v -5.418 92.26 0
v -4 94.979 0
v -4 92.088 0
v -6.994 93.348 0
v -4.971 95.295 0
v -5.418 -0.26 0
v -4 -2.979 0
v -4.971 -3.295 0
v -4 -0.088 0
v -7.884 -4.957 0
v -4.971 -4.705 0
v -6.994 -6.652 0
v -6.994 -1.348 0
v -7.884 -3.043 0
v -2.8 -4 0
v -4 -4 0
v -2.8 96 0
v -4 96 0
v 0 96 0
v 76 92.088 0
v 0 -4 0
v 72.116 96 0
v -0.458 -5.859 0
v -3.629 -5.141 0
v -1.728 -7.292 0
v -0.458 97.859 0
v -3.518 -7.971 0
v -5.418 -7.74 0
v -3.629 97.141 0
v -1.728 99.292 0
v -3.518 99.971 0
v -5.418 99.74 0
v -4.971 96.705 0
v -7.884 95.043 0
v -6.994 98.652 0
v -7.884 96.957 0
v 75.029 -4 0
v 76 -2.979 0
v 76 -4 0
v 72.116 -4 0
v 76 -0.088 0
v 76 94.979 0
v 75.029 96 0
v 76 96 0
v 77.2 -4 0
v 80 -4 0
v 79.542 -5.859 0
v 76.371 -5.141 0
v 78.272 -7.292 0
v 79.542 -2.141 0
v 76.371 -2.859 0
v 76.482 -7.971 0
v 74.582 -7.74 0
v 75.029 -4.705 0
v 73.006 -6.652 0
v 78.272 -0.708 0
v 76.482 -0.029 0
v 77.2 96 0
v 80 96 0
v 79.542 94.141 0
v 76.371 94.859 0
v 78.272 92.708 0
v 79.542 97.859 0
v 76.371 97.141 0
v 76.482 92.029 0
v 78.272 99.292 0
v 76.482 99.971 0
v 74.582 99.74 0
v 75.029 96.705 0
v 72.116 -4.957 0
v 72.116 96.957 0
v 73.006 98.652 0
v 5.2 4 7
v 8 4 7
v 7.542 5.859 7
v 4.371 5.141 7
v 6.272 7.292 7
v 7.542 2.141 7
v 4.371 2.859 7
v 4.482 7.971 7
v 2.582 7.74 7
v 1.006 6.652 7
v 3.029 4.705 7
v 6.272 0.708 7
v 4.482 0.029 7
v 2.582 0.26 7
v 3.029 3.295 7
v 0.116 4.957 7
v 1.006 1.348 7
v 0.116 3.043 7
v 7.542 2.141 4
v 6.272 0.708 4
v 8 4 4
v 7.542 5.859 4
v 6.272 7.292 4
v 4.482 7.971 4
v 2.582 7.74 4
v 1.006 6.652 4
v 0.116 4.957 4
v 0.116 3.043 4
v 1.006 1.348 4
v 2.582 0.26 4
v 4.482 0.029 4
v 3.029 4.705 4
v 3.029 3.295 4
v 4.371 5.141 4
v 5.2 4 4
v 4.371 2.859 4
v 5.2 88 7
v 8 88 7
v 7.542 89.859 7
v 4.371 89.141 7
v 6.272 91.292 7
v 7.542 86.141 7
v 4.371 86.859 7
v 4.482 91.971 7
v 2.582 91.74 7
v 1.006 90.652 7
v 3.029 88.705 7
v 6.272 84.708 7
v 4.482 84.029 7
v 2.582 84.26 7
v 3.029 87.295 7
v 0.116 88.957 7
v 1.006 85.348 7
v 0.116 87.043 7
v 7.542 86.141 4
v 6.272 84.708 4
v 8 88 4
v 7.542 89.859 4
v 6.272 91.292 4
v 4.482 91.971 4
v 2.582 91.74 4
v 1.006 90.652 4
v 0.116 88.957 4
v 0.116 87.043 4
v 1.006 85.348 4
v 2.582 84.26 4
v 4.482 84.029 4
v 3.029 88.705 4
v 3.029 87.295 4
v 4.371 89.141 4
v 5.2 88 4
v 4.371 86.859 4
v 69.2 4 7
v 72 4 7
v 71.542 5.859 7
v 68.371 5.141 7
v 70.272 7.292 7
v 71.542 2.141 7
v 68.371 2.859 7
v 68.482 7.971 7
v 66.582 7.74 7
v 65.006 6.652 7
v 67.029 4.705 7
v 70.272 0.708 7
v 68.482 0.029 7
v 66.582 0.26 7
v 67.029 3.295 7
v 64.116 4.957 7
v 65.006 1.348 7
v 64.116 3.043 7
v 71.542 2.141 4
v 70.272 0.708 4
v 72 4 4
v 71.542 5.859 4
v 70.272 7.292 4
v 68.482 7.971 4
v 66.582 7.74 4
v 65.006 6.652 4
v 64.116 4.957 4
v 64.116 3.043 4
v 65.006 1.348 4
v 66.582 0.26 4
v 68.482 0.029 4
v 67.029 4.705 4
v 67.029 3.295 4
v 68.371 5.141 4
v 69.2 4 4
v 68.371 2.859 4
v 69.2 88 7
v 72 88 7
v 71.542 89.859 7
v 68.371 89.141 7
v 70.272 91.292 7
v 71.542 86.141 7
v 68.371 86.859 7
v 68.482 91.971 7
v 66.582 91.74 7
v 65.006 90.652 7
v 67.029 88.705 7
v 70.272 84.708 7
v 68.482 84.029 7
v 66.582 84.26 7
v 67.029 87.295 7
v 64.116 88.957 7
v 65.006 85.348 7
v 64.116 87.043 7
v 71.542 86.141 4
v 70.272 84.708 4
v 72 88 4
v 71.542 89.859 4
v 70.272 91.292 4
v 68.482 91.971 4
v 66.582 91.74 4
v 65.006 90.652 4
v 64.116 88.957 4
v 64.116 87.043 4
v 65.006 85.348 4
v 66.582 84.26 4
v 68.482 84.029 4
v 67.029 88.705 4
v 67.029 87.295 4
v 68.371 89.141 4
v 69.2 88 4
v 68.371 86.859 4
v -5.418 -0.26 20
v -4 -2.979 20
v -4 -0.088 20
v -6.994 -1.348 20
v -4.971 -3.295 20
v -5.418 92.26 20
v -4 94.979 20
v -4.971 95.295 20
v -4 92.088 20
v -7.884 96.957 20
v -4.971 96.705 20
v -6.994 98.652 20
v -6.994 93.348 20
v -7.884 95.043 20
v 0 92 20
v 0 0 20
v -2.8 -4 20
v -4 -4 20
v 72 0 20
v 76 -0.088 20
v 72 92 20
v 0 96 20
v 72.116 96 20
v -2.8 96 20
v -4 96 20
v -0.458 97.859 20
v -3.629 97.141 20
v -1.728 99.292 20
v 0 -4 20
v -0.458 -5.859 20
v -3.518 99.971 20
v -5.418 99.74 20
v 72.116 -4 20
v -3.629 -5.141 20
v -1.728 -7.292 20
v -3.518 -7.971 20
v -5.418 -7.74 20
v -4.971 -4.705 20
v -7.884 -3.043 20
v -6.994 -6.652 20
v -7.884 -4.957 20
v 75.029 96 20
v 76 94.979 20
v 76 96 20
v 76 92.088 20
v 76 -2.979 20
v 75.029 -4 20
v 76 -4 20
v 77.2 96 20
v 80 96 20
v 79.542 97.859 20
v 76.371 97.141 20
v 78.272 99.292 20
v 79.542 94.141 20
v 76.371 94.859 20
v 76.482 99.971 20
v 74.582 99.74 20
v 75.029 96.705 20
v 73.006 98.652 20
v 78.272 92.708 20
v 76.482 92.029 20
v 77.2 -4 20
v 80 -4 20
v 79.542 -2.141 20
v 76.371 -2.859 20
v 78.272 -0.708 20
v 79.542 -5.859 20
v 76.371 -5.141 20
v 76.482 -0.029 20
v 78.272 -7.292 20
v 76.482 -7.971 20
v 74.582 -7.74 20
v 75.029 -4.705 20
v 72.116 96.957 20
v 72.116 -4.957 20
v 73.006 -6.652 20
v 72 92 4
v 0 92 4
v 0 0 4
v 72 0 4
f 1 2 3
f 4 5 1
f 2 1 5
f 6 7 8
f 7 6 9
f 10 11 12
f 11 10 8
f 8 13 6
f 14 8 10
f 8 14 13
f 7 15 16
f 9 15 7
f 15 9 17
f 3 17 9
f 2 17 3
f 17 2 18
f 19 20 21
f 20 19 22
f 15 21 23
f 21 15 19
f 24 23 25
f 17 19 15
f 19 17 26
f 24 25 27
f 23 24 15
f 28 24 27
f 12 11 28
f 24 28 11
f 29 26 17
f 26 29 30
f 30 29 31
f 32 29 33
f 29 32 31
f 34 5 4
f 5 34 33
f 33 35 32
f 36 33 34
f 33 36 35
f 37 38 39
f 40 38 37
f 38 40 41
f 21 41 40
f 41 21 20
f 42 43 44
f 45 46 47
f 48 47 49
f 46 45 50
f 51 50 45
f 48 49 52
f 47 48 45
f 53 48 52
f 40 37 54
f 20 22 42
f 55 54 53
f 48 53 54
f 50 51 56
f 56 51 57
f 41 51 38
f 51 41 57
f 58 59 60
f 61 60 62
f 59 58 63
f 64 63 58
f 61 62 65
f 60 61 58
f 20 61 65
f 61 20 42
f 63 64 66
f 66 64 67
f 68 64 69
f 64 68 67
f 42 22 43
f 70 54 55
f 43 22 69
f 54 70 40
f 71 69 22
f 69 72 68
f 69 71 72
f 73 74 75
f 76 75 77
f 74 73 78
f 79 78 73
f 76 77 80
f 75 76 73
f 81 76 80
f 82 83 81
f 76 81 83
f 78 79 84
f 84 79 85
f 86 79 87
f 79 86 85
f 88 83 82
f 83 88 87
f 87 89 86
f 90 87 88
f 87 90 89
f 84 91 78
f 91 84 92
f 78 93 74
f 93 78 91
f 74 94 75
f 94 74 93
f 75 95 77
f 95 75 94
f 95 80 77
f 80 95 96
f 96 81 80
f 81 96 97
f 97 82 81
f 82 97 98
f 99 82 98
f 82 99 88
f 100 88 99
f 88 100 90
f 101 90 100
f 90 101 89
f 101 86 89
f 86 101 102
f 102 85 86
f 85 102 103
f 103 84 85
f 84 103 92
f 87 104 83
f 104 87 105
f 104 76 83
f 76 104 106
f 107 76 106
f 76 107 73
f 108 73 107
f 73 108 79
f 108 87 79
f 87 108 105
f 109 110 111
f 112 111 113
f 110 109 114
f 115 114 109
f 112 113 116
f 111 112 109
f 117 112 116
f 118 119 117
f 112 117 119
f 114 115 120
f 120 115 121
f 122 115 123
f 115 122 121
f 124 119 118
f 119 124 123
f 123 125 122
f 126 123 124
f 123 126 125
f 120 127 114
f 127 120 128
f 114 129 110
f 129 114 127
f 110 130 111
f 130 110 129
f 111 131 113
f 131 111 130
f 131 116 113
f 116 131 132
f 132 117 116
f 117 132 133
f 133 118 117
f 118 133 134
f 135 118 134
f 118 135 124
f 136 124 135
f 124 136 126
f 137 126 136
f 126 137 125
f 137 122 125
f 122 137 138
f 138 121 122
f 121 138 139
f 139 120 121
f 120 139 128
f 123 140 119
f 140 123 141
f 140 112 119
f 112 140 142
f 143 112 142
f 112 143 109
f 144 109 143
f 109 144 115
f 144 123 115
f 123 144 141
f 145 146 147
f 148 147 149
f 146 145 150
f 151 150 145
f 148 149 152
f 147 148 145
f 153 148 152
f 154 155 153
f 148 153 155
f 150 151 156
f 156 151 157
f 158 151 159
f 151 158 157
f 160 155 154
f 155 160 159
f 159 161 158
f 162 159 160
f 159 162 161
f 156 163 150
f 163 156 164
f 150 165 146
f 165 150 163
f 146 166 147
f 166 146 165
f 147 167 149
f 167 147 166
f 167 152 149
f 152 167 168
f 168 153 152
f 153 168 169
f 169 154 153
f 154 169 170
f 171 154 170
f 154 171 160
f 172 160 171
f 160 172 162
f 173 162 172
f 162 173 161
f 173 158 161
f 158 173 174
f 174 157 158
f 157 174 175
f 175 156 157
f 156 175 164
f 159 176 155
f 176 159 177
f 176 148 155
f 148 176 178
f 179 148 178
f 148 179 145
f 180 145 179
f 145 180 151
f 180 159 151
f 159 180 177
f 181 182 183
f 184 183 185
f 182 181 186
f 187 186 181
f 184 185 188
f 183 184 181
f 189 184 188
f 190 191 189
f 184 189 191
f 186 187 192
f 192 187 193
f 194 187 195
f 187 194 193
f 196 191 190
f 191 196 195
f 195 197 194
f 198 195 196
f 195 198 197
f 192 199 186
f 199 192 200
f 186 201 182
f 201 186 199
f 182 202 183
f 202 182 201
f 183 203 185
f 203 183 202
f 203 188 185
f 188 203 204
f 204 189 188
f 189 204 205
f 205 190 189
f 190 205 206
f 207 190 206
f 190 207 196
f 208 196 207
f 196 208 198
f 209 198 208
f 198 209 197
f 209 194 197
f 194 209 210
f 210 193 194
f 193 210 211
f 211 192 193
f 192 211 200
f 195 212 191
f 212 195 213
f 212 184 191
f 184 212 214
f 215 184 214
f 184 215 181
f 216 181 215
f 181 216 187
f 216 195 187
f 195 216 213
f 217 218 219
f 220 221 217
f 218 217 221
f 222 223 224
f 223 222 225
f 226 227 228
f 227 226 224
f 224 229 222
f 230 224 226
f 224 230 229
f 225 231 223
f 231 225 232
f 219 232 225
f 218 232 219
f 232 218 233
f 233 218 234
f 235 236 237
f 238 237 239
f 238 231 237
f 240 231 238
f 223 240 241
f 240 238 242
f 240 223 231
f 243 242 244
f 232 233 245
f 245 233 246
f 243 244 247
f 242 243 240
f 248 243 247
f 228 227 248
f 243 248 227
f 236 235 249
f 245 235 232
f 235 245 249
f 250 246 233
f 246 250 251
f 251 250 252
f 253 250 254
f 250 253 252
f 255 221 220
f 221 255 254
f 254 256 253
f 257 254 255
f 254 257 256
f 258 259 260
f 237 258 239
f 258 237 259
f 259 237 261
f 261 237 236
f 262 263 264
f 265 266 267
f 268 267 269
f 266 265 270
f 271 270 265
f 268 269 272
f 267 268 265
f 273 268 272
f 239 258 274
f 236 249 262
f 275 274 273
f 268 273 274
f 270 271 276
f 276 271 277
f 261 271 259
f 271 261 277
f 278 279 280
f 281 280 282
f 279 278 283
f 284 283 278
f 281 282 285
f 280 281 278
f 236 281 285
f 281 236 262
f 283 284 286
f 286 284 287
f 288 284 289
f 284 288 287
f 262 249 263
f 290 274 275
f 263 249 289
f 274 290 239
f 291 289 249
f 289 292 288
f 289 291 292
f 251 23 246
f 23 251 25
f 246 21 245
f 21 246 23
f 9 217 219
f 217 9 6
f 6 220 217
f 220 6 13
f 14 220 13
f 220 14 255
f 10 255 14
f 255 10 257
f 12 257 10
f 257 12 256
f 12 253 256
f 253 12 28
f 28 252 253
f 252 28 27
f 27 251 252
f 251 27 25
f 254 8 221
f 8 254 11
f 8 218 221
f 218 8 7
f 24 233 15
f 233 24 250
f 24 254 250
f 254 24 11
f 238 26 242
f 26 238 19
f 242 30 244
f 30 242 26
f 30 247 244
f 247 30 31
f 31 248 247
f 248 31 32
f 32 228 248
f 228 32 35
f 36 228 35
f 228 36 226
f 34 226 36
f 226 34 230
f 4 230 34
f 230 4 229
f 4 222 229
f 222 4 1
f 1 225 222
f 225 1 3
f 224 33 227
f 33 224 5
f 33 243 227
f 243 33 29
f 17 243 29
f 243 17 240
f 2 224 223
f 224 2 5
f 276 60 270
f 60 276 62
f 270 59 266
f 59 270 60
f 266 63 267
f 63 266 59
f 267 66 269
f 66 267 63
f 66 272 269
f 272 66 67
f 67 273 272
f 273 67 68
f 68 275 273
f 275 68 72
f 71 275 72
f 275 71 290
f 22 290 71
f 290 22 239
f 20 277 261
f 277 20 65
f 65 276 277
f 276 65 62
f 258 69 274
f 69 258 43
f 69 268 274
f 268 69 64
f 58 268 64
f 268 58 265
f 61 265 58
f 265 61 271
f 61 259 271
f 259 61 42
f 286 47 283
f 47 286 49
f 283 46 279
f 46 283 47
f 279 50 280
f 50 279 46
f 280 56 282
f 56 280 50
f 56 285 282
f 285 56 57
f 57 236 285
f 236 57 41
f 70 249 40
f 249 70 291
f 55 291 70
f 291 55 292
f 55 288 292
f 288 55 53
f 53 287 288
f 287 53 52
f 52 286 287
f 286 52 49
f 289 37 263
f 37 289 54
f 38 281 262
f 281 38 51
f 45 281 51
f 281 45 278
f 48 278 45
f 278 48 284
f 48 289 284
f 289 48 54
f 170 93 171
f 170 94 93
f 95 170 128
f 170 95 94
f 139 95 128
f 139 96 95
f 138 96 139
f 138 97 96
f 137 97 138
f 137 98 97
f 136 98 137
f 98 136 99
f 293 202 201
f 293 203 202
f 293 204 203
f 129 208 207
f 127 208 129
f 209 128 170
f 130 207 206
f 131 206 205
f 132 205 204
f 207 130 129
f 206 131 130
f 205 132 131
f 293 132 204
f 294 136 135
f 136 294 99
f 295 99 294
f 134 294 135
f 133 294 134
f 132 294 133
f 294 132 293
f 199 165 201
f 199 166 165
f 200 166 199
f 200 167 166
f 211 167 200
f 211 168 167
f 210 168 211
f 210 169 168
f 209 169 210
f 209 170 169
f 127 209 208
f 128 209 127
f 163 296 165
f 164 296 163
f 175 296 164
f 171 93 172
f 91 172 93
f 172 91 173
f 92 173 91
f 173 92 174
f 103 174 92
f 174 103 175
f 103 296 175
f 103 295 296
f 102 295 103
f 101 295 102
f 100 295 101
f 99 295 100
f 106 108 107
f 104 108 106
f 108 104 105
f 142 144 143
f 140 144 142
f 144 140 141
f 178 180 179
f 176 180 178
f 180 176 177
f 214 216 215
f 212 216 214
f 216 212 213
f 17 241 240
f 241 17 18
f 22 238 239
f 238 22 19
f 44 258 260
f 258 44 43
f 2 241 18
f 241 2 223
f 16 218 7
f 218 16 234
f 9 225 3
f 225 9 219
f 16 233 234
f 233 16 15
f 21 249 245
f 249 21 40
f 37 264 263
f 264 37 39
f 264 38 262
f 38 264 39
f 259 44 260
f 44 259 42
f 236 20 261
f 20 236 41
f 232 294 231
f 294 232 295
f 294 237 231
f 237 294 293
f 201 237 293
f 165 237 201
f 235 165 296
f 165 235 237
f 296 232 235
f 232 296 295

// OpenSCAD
/* 
    Author: Kevin Lutzer
    Created: March 28 2020
    Description: Case for a led 4X4 Led matrix I made.
*/

// Dimensions
pcb_width = 72;
pcb_length = 92;
pcb_height_from_bottom = 3;
wall_thickness = 4;
bottom_thickness = 4;
wall_height = 16;
screw_position = 4;


module bottom() {
   linear_extrude(height = bottom_thickness)
    square([pcb_width + 2 * wall_thickness, pcb_length + 2 * wall_thickness]);
}

module wall() {
    linear_extrude(height = wall_height)
        difference() {
            square([pcb_width + 2 * wall_thickness, pcb_length + 2 * wall_thickness]);
            translate([wall_thickness, wall_thickness])
                square([pcb_width, pcb_length]);
        }     
}


module base_screw_post() {
   linear_extrude(height = wall_height + bottom_thickness )
        difference() {
            circle(r = 4);
            circle(d = 2.4);
        }
}

module base_screw_posts() {
  translate([-wall_thickness, -wall_thickness])
    base_screw_post();
  translate([-wall_thickness, pcb_length + wall_thickness])
    base_screw_post(); 
  translate([pcb_width + wall_thickness, pcb_length + wall_thickness])
    base_screw_post(); 
  translate([pcb_width + wall_thickness, - wall_thickness])
    base_screw_post(); 
} 

module pcb_screw_post() {
   linear_extrude(height = bottom_thickness + pcb_height_from_bottom )
        difference() {
            circle(r = 4);
            circle(d = 2.4);
        }
}

module pcb_screw_posts() {
    translate([screw_position, screw_position])
        pcb_screw_post();
    translate([screw_position, pcb_length - screw_position])
        pcb_screw_post();
    translate([pcb_width - screw_position, screw_position])
        pcb_screw_post();
    translate([pcb_width - screw_position, pcb_length - screw_position])
        pcb_screw_post();
}

module base() {
    union() {
        translate([-wall_thickness, -wall_thickness, bottom_thickness])
            wall();
        translate([-wall_thickness, -wall_thickness, 0])
            bottom();
        pcb_screw_posts();
        base_screw_posts();
    }
}

base();
